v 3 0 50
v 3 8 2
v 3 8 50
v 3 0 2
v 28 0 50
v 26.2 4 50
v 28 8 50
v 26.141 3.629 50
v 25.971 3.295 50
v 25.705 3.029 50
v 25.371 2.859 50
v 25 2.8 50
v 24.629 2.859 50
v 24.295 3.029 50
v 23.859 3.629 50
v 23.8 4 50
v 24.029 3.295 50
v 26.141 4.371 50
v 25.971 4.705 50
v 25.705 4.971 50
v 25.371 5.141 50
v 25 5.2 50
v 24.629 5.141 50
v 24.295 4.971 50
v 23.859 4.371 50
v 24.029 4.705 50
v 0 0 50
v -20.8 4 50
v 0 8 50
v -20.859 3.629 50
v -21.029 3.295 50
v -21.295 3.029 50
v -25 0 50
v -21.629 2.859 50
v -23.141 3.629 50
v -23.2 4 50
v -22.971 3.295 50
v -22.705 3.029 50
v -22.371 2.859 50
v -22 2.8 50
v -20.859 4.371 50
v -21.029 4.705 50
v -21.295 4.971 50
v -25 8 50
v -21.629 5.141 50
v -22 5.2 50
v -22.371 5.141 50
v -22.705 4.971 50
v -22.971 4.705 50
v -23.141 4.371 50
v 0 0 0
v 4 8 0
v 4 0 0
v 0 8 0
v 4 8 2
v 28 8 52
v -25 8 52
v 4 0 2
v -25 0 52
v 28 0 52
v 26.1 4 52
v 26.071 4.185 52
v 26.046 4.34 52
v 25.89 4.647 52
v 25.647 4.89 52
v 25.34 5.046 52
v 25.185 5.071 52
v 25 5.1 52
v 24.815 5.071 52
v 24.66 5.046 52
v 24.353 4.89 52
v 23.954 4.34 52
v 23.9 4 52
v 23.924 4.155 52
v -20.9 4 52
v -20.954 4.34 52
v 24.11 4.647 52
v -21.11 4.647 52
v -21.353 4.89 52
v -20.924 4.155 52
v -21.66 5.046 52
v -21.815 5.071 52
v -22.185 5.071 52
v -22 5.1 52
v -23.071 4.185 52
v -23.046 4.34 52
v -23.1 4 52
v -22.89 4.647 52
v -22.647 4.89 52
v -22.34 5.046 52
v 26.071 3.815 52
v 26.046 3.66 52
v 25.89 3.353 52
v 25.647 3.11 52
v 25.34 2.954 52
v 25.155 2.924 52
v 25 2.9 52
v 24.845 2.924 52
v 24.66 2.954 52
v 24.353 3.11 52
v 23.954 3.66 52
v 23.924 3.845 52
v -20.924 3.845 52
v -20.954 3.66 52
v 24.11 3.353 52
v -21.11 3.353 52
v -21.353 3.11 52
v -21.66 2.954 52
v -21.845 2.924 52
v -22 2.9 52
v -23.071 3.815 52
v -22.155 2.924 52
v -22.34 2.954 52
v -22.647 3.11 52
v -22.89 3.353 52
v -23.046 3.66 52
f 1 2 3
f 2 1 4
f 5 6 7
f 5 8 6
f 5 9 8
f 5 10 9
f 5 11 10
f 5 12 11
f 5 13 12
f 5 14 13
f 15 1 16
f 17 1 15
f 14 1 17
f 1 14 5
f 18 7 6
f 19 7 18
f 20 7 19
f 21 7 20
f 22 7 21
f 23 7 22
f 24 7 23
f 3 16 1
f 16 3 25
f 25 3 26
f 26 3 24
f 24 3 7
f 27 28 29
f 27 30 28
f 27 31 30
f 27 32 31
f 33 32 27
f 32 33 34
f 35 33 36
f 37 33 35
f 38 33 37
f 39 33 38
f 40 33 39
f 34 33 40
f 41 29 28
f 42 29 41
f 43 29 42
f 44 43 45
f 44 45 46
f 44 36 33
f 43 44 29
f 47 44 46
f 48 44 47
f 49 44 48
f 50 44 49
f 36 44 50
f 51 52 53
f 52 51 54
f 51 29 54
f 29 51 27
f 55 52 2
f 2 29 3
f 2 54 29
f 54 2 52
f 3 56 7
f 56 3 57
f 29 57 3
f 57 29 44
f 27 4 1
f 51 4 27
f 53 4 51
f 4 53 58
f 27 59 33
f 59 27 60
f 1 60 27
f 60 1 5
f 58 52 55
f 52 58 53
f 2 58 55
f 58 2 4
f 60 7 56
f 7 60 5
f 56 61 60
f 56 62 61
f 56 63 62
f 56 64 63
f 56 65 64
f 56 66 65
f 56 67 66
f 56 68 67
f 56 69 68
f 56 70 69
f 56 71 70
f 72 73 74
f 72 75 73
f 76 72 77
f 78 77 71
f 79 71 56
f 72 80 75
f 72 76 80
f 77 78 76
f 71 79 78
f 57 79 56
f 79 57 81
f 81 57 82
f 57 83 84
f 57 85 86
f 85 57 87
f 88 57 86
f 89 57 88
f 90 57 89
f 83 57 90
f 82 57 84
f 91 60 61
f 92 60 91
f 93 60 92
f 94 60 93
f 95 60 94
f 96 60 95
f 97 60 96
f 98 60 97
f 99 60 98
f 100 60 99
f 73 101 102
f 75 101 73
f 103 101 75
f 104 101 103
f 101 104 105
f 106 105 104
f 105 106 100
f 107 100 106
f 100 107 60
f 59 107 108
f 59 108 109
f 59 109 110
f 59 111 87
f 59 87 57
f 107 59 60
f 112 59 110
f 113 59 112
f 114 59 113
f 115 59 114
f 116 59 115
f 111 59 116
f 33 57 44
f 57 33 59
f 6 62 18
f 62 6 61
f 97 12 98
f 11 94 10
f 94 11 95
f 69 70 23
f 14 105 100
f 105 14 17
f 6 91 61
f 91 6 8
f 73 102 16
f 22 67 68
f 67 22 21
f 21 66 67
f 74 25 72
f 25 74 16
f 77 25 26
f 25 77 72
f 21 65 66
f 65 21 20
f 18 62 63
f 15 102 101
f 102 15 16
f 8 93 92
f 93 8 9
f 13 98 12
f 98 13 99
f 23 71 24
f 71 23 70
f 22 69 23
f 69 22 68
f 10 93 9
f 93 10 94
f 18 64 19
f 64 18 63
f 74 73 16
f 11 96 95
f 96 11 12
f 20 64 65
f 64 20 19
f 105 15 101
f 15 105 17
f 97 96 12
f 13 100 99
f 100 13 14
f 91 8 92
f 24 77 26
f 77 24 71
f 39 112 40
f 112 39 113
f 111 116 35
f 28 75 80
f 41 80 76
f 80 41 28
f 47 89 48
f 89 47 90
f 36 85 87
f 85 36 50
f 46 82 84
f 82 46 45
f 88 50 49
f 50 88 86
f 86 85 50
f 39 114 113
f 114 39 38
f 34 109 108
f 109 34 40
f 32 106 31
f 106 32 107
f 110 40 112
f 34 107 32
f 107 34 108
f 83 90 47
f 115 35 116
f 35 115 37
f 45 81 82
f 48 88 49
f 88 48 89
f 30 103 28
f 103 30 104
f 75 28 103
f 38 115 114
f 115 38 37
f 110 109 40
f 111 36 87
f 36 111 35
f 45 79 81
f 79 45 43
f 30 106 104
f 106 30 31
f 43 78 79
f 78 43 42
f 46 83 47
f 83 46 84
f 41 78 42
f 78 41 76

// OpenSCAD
difference(){
    union(){
        
        translate([0,0,0]) cube([3,8,50]);
        translate([0,0,0]) cube([4,8,2]);
        translate([-25,0,50]) cube([53,8,2]);
        
    };
    union(){
        translate([25,4,50]) cylinder(4,1.2,$fn=20);
        translate([-25+3,4,50]) cylinder(4,1.2,$fn=20);
    };
 };
